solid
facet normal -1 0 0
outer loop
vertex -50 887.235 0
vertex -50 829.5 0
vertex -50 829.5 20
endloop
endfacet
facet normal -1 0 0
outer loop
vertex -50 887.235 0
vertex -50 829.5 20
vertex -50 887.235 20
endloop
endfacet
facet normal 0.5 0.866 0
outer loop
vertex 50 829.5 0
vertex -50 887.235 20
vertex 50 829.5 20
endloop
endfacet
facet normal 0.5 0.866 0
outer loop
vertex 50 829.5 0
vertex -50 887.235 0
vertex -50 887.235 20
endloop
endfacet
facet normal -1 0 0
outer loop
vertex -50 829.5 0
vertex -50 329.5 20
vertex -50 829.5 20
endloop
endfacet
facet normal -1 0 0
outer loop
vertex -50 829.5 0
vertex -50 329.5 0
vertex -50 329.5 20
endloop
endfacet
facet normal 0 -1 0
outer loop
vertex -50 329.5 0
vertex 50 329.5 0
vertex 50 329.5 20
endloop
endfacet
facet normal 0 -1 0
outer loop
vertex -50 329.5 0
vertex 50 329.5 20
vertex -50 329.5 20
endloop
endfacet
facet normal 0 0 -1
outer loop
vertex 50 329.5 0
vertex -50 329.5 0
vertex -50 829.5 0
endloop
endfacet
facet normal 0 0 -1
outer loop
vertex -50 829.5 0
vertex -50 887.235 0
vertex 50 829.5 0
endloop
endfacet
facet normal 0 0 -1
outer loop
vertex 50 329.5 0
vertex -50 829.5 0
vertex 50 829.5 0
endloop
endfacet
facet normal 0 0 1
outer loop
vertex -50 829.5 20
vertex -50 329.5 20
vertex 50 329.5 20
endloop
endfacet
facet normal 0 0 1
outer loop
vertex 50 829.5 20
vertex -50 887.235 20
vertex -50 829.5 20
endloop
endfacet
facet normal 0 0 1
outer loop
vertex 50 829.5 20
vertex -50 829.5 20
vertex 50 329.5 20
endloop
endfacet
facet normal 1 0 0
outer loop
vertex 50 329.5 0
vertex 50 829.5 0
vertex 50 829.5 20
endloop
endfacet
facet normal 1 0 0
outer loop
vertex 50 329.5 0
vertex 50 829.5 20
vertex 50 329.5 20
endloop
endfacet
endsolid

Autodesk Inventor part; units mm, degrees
ref_plane "YZ Plane" through (0, 0, 0) normal (1, 0, 0) x (0, 1, 0)
ref_plane "XZ Plane" through (0, 0, 0) normal (0, 1, 0) x (-1, 0, 0)
ref_plane "XY Plane" through (0, 0, 0) normal (0, 0, 1) x (1, 0, 0)
sketch "Sketch1" plane through (0, 0, 0) normal (0, 0, 1) x (1, 0, 0)
  line L0 (50, 829.4999) -> (50, 329.4999)
  line L1 (50, 329.4999) -> (-50, 329.4999)
  line L2 (-50, 329.4999) -> (-50, 829.4999)
  line L3 (-50, 829.4999) -> (-50, 887.2349)
  line L4 (-50, 829.4999) -> (7.735, 829.4999) construction
  line L5 (-50, 887.2349) -> (50, 829.4999)
  dimension "d2" = 57.735
  dimension "d3" = 90
  dimension "d6" = 500
  dimension "d7" = 500
extrude "Extrusion1" add sketch "Sketch1" along normal blind 20
